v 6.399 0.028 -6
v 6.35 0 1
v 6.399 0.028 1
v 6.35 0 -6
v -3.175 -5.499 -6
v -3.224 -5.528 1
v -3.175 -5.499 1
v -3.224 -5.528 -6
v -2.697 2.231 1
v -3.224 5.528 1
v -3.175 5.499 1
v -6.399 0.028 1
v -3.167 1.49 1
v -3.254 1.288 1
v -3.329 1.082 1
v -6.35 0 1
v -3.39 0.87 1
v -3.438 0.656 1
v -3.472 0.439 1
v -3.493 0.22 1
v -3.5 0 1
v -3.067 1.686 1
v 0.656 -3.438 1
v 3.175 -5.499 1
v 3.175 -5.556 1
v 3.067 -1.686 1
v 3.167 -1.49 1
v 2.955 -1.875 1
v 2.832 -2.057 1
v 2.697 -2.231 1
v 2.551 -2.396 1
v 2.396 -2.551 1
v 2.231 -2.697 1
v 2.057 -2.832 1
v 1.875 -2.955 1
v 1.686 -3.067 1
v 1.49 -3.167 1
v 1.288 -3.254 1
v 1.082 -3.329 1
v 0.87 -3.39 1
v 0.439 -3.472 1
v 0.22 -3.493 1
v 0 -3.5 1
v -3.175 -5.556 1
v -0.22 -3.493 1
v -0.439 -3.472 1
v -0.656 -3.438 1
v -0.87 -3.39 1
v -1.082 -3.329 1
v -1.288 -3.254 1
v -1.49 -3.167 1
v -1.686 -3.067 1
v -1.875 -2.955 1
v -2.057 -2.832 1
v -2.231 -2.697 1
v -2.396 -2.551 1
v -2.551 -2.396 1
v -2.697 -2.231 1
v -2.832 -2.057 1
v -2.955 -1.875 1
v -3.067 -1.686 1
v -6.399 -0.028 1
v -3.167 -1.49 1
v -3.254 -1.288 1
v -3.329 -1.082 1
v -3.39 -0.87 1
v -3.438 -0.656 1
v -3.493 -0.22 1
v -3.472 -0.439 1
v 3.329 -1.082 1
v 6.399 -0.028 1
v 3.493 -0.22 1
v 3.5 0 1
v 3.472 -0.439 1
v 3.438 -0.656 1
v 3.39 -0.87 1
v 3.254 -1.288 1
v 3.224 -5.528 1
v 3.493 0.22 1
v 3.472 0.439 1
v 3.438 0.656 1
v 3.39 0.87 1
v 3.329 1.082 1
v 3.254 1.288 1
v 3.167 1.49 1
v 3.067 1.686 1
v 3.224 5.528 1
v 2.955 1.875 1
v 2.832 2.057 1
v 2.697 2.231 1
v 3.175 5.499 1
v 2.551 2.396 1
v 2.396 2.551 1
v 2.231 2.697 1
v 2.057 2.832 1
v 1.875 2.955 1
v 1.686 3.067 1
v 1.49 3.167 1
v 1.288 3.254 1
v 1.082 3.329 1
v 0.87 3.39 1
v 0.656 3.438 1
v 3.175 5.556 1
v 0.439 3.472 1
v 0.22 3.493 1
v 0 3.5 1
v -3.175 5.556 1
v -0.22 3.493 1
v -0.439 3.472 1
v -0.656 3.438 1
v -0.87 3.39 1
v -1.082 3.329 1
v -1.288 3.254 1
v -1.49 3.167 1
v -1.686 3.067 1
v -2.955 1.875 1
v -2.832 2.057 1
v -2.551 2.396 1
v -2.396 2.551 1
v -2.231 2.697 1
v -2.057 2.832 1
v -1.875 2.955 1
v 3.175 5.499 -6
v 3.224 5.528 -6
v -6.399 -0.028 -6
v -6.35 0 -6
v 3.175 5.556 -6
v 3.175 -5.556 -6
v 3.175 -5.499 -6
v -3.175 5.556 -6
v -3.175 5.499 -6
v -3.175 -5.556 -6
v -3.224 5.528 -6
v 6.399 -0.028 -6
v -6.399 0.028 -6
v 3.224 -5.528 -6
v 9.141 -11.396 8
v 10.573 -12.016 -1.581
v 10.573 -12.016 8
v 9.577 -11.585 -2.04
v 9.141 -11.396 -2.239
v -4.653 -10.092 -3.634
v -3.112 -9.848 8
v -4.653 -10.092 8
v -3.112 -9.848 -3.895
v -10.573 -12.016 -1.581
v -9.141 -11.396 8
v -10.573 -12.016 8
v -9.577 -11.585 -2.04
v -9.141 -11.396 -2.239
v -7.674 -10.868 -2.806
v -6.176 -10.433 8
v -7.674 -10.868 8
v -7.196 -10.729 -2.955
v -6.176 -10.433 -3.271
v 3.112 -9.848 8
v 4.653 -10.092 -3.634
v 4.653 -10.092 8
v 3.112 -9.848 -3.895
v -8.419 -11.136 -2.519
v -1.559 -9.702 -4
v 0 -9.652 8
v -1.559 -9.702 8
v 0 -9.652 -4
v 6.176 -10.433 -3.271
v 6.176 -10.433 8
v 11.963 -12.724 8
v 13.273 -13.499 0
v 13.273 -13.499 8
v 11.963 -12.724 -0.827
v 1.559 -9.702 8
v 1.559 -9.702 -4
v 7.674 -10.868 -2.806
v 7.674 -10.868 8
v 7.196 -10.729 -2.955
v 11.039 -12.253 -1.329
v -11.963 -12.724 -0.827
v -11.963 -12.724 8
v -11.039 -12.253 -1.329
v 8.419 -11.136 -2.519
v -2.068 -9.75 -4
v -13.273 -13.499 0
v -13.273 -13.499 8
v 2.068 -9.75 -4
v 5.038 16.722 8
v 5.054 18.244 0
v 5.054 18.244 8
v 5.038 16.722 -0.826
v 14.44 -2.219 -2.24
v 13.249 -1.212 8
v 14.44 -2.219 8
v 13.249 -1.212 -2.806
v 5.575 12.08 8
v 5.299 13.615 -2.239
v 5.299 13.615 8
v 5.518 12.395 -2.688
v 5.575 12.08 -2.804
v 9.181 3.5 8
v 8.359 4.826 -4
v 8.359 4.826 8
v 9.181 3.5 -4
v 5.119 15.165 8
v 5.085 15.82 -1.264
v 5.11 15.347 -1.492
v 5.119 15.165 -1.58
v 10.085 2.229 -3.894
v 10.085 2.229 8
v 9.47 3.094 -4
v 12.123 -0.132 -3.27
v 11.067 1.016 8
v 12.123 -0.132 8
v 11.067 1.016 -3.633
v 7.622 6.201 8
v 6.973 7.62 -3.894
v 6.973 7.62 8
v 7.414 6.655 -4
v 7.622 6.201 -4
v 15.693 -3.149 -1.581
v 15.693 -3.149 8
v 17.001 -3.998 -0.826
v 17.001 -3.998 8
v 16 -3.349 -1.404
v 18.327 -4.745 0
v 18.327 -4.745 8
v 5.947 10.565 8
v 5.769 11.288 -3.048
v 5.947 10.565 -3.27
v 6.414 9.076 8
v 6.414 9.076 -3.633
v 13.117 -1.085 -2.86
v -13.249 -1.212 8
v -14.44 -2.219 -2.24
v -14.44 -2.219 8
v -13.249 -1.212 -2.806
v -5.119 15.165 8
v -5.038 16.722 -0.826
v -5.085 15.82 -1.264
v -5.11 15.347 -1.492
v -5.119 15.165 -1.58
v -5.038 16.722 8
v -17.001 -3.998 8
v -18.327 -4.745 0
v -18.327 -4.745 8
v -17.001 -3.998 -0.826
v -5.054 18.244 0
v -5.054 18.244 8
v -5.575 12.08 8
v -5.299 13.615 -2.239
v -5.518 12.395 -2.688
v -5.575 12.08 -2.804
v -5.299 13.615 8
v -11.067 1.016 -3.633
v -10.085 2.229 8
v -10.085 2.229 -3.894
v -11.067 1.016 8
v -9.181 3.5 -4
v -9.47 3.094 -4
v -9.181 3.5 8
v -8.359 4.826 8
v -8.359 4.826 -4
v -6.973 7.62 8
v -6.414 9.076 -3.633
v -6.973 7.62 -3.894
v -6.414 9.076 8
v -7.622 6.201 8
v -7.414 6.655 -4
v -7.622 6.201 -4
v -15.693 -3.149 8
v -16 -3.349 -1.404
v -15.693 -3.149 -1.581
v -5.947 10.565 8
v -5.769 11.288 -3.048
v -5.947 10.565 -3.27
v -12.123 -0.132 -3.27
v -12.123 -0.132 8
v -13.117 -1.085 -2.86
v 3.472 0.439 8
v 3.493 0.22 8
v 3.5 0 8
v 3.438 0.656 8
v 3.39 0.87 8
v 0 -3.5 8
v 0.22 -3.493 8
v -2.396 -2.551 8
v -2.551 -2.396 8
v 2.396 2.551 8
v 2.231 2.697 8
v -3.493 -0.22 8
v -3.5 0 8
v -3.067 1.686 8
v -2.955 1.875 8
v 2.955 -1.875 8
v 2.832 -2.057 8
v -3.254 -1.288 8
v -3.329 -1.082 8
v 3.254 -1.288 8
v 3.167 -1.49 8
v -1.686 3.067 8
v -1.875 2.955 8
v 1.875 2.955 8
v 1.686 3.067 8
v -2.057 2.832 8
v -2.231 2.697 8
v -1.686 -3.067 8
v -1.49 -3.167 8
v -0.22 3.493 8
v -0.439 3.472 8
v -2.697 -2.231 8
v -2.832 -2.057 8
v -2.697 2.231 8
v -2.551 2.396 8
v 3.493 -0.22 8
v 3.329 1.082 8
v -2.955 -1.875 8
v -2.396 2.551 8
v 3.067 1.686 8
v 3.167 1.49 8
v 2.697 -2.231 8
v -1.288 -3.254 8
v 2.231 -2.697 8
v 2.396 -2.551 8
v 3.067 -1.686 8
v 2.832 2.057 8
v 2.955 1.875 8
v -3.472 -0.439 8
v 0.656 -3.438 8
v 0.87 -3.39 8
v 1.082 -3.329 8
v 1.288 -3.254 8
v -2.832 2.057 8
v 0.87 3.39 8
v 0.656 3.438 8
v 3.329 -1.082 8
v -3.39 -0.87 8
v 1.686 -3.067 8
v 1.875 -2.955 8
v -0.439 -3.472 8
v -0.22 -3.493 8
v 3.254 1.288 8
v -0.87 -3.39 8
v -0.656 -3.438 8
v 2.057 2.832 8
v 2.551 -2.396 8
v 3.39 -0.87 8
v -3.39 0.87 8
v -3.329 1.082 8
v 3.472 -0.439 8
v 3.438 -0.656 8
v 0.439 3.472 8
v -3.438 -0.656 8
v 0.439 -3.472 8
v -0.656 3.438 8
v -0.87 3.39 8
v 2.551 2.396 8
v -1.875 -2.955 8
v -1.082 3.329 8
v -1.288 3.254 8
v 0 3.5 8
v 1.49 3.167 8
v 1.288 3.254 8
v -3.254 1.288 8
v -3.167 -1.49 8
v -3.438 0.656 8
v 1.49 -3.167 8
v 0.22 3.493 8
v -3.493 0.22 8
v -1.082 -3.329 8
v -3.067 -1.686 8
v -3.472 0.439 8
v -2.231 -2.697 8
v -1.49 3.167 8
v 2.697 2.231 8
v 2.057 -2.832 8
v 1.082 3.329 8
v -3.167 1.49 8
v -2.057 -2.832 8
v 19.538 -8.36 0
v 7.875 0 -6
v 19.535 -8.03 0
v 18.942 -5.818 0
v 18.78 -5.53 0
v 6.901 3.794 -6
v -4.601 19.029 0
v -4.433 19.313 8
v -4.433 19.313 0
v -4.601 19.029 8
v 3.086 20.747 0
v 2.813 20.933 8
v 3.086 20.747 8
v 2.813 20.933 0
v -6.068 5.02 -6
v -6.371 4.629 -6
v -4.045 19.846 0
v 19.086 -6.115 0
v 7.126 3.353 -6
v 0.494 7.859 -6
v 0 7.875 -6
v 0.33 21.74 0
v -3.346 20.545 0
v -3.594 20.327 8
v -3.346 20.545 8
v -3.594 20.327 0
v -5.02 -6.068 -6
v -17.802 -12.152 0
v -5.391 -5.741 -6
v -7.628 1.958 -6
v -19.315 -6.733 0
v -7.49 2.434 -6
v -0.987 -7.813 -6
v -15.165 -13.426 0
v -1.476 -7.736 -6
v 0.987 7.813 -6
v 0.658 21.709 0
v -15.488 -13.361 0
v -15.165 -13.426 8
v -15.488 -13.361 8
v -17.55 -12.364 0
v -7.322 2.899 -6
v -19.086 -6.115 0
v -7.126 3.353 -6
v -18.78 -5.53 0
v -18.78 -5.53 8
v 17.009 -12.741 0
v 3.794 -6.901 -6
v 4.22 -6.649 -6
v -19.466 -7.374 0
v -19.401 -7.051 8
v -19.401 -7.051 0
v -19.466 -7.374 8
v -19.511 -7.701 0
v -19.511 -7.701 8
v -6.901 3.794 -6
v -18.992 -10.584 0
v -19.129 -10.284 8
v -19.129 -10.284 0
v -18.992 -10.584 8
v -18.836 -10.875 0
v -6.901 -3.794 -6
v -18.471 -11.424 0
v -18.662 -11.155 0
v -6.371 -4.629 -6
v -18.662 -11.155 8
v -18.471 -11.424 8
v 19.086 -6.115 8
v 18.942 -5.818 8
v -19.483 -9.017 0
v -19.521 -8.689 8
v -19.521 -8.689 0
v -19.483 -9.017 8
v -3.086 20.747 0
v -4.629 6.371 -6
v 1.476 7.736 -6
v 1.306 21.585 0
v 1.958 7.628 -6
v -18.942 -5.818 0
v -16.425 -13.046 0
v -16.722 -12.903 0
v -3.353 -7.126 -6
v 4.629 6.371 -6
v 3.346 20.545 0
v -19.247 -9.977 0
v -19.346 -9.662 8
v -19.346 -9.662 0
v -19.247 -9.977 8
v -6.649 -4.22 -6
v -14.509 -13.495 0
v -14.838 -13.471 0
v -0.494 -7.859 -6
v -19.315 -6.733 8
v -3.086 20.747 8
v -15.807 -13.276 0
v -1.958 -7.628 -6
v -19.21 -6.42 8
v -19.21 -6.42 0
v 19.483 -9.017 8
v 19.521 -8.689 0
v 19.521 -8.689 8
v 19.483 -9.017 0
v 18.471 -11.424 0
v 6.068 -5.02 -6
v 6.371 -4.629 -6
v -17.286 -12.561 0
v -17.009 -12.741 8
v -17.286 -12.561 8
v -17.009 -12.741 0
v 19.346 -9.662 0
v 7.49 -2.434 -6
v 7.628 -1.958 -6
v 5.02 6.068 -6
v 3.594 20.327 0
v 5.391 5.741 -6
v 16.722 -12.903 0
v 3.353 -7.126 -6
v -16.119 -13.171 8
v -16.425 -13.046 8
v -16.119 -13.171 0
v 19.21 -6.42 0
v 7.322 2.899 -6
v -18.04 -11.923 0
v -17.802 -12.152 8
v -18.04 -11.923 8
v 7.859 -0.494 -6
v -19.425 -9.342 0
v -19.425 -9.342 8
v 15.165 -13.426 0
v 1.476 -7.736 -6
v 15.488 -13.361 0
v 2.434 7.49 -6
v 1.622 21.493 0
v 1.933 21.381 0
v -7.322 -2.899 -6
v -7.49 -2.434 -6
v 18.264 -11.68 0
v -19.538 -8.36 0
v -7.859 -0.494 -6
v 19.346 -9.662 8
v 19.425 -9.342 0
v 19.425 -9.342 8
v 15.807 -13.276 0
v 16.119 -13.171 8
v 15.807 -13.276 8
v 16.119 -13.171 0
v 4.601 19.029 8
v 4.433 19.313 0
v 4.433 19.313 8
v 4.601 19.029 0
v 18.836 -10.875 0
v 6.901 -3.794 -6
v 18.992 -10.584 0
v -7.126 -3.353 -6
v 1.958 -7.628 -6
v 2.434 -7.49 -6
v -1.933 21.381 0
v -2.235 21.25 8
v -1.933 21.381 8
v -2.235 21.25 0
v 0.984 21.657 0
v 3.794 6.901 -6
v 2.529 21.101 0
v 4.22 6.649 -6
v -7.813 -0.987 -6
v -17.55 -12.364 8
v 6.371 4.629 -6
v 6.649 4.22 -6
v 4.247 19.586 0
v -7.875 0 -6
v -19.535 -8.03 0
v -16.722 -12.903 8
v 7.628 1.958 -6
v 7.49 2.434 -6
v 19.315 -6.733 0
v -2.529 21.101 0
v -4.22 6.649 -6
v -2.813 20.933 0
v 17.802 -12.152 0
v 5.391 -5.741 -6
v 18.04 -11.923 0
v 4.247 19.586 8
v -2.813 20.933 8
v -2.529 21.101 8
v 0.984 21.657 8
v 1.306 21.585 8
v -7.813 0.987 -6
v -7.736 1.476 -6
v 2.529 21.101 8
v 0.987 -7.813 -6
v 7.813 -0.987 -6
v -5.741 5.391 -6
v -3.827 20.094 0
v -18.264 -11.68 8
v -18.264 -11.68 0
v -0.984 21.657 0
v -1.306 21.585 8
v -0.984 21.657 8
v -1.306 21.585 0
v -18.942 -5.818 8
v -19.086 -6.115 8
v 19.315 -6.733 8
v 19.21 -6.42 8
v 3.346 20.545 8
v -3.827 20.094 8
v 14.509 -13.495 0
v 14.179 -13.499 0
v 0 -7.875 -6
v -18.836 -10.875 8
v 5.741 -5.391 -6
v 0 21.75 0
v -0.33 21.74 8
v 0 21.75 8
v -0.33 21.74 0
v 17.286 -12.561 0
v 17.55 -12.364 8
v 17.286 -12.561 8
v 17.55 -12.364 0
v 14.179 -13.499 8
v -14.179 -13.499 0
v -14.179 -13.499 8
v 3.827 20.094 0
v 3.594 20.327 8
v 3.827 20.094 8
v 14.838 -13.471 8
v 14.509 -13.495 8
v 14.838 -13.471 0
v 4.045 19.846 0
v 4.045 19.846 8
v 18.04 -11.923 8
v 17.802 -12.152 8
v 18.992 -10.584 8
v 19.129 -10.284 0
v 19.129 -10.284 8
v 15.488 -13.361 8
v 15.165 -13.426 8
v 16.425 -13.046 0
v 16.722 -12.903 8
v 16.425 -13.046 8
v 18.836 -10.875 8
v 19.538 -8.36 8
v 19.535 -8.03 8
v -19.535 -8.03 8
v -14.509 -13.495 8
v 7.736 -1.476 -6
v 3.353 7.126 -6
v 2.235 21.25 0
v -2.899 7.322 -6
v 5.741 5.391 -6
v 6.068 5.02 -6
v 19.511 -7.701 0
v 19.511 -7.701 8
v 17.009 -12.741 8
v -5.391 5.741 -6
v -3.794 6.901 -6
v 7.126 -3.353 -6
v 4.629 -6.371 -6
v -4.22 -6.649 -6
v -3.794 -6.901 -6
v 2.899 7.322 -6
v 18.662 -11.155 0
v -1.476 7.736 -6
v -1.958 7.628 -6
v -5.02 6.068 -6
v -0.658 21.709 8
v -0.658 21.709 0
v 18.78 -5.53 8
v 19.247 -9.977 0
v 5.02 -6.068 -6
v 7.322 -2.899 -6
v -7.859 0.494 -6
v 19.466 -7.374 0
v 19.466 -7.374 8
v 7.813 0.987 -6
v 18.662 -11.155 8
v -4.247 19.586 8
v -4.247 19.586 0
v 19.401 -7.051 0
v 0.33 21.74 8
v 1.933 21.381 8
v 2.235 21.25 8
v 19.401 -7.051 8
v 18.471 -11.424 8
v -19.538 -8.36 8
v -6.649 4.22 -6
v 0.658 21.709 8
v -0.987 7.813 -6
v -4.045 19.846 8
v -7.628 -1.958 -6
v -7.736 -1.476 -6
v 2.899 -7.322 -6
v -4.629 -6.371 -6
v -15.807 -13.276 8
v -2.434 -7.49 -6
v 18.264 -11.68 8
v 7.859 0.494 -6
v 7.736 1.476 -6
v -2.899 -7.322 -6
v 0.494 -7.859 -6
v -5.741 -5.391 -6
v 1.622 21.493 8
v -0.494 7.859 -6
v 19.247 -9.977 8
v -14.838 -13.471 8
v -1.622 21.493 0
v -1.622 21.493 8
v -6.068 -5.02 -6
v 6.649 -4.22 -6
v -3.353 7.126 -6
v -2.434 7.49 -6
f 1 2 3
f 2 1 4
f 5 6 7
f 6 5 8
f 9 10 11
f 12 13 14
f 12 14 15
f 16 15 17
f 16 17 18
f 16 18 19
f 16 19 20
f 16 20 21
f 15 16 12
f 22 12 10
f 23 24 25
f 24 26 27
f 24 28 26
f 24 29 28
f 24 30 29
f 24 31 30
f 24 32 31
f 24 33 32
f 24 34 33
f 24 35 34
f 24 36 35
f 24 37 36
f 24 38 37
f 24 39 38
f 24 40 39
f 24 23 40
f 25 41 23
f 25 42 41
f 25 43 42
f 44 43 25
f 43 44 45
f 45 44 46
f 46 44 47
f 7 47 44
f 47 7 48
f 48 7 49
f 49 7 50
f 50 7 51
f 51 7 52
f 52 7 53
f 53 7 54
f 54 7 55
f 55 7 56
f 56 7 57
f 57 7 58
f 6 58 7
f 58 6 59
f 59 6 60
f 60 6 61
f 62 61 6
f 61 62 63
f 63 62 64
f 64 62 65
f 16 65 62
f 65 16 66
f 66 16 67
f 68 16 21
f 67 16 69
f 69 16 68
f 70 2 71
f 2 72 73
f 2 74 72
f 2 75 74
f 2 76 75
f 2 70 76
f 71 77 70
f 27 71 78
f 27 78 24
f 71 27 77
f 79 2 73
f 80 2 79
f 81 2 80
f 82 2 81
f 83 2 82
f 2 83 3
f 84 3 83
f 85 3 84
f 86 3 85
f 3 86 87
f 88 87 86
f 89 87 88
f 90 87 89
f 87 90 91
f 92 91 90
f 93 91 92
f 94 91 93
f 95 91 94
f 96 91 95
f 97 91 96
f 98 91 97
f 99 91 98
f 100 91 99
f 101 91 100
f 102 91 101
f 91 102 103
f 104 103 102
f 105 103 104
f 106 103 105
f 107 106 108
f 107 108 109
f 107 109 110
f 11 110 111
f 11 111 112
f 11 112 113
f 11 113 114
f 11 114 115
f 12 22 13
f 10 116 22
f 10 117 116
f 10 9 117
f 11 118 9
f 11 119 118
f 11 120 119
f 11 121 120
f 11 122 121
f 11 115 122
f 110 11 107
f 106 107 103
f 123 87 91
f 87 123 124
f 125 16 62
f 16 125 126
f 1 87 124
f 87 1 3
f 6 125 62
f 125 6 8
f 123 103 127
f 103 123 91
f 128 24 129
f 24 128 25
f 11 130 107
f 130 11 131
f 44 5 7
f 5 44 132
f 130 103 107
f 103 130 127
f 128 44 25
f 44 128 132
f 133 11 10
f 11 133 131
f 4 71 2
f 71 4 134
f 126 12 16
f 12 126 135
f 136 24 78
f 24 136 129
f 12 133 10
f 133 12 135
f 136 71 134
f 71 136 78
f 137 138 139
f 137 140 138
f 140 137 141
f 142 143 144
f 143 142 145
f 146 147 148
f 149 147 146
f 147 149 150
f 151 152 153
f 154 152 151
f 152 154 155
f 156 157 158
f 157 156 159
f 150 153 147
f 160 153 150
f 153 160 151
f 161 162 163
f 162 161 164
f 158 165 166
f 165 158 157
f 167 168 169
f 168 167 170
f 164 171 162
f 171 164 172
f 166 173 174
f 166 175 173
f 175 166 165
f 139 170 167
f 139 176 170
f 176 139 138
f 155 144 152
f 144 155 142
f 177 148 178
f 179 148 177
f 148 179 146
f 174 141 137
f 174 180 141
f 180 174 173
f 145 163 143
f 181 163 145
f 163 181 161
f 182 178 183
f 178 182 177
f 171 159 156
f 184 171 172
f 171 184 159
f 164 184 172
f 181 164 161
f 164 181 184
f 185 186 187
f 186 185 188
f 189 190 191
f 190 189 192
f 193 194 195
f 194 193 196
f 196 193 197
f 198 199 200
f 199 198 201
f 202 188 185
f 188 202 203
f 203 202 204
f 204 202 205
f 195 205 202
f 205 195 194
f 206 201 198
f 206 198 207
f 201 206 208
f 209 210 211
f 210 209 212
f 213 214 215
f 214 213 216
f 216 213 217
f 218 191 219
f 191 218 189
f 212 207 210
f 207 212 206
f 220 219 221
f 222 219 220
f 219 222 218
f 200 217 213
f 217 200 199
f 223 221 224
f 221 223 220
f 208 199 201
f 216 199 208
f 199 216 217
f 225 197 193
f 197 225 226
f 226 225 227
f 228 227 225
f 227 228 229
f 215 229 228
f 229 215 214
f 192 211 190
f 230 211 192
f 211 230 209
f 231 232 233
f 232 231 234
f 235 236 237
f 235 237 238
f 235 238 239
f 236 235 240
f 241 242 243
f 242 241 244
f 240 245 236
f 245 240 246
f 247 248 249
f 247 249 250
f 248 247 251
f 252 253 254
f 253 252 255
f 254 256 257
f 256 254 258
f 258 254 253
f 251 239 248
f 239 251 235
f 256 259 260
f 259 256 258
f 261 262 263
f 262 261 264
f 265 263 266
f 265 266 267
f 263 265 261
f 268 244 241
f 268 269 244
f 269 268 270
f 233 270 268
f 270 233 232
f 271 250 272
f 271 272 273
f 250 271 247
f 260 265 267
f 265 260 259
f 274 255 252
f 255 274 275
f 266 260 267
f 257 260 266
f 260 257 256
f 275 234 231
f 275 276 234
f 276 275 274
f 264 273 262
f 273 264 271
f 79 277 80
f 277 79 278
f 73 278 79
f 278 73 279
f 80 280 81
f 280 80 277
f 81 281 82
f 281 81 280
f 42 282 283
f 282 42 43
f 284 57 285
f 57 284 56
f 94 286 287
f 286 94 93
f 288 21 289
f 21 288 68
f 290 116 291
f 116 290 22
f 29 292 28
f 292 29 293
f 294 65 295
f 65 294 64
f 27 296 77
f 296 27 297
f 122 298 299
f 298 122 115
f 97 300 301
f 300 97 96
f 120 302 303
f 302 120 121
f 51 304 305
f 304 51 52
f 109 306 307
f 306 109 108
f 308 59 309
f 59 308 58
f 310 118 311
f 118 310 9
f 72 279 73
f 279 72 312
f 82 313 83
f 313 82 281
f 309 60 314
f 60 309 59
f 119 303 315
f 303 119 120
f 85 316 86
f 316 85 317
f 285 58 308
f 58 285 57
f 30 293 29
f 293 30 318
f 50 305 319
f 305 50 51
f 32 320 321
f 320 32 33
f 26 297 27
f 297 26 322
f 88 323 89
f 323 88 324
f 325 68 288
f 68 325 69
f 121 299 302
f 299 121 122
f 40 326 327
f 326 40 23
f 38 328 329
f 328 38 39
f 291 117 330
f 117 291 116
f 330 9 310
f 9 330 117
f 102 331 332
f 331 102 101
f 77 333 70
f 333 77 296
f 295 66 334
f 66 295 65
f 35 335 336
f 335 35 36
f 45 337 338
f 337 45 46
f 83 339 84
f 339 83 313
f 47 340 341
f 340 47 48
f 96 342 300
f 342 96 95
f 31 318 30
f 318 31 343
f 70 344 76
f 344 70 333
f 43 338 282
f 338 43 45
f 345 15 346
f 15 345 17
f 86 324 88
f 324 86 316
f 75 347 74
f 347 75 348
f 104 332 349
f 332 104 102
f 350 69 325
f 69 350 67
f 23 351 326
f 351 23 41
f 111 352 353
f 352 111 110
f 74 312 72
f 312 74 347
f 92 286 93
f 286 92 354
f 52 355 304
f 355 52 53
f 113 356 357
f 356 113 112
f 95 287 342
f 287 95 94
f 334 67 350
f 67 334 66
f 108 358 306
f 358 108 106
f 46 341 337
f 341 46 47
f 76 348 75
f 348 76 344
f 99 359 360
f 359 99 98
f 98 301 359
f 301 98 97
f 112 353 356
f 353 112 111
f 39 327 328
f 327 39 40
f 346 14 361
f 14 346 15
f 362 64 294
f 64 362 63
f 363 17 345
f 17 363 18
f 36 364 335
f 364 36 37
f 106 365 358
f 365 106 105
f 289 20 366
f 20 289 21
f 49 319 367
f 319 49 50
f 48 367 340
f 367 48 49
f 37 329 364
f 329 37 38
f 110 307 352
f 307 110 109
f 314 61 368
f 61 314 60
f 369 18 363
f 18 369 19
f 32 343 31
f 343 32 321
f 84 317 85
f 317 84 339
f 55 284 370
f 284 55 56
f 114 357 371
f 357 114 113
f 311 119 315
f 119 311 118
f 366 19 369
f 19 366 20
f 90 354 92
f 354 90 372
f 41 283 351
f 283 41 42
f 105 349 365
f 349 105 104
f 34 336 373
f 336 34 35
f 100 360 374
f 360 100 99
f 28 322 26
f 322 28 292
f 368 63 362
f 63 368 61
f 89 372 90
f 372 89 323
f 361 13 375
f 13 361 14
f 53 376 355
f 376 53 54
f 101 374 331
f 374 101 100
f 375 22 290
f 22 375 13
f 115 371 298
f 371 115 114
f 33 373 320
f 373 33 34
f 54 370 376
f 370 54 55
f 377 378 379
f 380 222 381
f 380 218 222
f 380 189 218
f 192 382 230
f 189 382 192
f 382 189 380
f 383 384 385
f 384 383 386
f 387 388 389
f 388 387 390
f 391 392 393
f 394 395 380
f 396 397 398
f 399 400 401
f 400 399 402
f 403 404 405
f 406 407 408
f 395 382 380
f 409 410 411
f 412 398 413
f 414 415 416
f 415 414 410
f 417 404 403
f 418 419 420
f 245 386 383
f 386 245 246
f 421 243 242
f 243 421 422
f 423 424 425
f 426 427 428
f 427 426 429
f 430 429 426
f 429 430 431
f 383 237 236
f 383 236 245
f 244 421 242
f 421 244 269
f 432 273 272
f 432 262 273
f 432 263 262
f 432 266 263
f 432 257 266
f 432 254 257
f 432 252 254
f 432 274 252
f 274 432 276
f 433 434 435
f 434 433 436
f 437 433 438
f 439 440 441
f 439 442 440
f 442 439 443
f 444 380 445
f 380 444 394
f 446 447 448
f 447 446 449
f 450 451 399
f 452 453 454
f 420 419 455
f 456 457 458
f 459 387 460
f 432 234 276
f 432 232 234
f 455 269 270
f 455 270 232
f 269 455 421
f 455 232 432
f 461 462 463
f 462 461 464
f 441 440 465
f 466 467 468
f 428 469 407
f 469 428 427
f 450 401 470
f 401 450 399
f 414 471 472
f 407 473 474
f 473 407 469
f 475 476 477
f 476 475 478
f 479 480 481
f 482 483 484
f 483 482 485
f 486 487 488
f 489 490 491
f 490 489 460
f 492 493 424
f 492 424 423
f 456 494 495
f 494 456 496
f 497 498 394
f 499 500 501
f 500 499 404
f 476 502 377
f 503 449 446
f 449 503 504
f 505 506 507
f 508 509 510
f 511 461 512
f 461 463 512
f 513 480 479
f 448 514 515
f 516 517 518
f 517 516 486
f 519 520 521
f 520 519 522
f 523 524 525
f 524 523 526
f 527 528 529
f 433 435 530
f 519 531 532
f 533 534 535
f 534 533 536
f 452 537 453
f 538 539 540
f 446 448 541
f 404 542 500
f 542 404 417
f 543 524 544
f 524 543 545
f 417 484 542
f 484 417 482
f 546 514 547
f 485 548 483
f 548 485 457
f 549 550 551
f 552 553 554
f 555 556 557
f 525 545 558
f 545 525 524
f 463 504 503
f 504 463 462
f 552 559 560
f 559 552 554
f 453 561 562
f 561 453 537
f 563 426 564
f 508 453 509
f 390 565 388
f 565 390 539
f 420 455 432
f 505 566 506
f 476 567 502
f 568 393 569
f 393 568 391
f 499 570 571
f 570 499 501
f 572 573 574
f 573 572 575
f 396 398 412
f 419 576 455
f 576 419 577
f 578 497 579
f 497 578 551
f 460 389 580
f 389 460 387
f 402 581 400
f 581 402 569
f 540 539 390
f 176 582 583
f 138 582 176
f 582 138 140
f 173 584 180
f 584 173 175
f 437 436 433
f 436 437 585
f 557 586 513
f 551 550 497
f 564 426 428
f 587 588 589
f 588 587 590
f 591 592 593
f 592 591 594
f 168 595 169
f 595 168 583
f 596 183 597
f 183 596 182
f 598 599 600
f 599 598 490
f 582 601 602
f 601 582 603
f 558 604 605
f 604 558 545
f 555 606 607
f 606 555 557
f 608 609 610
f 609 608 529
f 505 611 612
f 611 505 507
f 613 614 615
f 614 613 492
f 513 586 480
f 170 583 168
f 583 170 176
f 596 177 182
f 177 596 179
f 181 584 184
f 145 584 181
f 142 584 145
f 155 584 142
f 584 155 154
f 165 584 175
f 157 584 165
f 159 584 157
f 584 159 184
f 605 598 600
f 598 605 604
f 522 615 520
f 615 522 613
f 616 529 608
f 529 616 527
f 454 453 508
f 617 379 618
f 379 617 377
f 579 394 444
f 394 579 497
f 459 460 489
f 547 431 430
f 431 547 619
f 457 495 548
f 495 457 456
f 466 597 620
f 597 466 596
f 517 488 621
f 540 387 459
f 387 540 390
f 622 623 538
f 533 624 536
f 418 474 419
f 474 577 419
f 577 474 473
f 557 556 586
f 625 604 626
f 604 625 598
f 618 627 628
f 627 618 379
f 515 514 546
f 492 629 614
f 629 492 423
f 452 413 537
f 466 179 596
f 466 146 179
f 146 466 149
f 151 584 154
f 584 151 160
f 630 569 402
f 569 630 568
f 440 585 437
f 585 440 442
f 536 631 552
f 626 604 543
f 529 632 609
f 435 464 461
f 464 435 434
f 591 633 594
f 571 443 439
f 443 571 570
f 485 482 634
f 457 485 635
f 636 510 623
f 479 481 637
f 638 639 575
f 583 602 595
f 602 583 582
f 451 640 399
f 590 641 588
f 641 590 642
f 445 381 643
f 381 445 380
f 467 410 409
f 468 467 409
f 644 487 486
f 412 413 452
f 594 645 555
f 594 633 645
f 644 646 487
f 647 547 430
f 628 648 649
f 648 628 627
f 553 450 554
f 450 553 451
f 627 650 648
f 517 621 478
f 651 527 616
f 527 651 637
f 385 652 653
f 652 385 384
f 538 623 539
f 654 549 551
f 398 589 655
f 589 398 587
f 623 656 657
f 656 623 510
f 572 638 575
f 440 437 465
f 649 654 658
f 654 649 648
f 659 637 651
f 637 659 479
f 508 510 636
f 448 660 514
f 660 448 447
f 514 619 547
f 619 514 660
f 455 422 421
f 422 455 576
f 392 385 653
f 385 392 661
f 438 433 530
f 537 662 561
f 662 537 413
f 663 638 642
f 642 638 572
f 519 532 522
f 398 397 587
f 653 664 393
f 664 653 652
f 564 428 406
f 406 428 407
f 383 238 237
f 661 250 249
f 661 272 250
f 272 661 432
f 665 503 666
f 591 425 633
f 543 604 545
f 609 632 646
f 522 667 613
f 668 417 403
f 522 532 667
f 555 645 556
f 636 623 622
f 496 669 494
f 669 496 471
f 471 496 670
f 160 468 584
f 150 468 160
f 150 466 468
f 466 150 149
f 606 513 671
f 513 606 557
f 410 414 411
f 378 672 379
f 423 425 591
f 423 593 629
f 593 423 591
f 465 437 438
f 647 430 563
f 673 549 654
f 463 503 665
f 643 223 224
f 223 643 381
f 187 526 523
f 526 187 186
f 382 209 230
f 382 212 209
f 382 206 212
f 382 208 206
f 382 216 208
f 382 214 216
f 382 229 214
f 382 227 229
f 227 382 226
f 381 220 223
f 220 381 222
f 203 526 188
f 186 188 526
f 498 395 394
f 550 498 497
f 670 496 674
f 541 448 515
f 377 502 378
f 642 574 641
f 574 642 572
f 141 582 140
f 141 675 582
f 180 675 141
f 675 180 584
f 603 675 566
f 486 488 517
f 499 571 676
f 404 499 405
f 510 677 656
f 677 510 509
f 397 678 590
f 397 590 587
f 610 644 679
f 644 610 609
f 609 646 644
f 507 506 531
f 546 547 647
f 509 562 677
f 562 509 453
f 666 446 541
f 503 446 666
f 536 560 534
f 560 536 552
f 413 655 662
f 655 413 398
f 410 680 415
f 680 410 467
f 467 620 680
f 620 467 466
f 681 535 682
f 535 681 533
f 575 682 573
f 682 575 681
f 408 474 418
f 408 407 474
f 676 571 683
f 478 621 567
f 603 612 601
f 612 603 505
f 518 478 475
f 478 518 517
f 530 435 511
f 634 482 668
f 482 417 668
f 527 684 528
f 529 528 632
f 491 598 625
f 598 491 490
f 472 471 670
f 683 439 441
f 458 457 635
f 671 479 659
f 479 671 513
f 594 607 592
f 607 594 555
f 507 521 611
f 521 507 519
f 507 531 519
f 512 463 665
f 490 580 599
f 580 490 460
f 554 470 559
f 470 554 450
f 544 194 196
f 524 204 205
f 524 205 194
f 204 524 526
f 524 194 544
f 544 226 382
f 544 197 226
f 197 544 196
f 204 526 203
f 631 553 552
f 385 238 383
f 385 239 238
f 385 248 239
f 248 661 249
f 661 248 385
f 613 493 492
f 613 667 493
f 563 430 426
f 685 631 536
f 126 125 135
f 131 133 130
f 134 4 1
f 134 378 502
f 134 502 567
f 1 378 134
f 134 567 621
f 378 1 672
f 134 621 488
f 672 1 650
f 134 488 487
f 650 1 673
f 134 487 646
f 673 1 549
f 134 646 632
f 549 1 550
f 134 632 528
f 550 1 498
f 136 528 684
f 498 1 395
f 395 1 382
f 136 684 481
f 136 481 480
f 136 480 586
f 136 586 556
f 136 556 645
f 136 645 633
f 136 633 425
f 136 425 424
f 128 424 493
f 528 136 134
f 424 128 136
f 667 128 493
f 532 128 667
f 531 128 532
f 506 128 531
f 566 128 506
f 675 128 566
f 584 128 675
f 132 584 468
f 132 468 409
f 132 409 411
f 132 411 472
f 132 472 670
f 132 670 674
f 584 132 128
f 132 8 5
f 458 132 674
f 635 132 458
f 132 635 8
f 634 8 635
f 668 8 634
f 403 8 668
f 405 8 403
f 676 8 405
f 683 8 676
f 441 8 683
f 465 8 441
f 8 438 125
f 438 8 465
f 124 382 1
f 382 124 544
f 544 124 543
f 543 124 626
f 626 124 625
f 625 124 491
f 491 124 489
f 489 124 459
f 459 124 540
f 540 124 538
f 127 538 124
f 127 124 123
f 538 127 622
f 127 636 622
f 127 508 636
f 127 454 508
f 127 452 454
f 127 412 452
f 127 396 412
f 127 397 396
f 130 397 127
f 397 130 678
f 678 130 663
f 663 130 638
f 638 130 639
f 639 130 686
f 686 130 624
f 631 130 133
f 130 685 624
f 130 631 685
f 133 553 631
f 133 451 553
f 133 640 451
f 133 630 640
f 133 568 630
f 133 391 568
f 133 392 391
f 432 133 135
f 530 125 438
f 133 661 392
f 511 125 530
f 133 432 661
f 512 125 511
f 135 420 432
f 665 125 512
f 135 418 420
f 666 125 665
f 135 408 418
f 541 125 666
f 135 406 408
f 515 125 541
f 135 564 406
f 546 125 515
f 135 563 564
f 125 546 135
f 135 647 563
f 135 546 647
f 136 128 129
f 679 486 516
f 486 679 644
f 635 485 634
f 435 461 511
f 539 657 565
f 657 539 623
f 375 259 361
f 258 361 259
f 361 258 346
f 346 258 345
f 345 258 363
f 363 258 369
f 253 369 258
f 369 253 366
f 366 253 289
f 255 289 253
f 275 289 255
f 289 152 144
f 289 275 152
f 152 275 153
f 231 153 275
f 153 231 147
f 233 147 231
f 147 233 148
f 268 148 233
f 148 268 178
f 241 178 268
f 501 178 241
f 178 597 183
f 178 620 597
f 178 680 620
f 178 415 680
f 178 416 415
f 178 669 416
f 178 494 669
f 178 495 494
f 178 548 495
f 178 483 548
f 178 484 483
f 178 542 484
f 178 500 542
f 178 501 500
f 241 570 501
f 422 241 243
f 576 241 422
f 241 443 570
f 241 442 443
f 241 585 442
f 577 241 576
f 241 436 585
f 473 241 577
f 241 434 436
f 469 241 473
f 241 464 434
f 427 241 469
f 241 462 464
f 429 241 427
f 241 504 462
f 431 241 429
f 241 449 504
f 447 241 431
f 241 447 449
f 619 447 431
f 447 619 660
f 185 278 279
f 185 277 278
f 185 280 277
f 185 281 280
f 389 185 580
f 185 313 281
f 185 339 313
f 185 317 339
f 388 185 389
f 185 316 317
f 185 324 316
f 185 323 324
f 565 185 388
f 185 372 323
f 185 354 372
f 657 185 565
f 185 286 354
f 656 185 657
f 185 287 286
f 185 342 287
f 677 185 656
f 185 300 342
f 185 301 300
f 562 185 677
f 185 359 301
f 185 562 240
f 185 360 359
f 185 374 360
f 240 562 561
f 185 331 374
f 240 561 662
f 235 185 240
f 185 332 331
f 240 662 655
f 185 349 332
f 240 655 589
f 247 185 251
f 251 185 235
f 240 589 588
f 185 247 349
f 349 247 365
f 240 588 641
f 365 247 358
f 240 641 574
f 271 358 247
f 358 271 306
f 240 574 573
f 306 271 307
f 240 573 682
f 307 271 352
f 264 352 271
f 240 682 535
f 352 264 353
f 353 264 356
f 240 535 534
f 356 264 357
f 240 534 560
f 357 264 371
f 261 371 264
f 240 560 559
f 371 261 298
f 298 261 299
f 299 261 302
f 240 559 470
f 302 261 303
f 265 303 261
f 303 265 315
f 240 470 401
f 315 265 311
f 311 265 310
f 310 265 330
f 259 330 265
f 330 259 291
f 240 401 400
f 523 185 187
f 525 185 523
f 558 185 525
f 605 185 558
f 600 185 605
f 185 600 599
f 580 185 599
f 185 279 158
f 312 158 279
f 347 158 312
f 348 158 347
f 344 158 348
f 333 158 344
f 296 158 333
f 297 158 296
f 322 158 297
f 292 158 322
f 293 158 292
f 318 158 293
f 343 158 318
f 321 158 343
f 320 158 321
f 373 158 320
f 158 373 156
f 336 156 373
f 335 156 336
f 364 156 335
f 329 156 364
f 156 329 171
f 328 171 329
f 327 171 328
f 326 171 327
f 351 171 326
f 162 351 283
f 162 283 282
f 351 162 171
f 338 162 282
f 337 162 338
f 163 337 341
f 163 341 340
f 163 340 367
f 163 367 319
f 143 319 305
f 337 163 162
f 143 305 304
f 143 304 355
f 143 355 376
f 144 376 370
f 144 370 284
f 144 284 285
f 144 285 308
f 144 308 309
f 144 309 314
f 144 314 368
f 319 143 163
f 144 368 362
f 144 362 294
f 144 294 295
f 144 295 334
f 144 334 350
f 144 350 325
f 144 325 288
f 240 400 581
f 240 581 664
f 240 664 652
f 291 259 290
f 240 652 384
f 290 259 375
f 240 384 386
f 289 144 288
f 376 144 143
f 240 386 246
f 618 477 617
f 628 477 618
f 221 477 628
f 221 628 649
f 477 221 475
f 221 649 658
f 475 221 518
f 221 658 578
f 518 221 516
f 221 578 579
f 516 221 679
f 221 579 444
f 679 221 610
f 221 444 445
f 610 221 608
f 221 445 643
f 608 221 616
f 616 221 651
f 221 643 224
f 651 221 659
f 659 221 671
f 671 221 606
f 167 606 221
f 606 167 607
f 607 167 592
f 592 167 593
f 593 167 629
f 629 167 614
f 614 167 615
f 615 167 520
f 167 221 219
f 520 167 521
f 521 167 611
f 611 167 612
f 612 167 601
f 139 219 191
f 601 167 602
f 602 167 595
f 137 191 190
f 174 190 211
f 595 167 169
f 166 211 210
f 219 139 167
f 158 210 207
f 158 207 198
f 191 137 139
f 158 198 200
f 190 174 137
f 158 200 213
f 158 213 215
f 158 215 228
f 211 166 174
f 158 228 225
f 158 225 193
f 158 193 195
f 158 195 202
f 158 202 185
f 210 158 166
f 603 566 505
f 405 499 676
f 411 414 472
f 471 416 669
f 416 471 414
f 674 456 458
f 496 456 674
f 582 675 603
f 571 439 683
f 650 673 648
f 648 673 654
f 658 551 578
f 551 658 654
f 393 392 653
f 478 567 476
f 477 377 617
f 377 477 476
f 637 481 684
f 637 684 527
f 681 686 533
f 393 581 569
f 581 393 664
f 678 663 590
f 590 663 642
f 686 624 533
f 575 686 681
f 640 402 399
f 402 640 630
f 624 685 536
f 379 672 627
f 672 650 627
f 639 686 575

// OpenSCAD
$fn = 100;

height = 8;
diameter = 10.5;
wingsize = 16.5;

// 1/4 inch hardware, press fit
hexHeight = 5;
hexWidth = 11.1125;
// Bore radius; 3.5 gives a 7.0 mm hole for a 1/4 in bolt.
throughHoleRadius = 3.5;


radius = diameter / 2;

module hexagon(size, height){
  boxWidth = size/1.75;
  for (r = [-60, 0, 60]){
		rotate([0,0,r]) 
			cube([boxWidth, size, height*2], true);
		}
	}

difference(){
  hull(){
		//Wings
    for(i=[0:2]){
      rotate([0,0,120*i])
      hull(){
        cylinder(r=radius*2, h=height);
        translate([0,wingsize,0])
          cylinder(r=radius, h=height);
        }
      }
		//Core
    translate([0,0,-height/2-2])
      cylinder(r=radius*1.5, h=height);
    }
  union(){
    //Bore
		translate([0,0,-height/2])
      cylinder(r=throughHoleRadius, h=height*3);
    
		//Nut
		translate([0,0,-4])
      hexagon(hexWidth, hexHeight);
    
		//Cutouts
		union(){
      for(i=[0:2]){
				rotate([0,0,120*i])
				translate([0,-wingsize*2.09,-height/2])
					cylinder(r=wingsize*1.505, h=height*2);
        }
      }
    }
  }
  
  
